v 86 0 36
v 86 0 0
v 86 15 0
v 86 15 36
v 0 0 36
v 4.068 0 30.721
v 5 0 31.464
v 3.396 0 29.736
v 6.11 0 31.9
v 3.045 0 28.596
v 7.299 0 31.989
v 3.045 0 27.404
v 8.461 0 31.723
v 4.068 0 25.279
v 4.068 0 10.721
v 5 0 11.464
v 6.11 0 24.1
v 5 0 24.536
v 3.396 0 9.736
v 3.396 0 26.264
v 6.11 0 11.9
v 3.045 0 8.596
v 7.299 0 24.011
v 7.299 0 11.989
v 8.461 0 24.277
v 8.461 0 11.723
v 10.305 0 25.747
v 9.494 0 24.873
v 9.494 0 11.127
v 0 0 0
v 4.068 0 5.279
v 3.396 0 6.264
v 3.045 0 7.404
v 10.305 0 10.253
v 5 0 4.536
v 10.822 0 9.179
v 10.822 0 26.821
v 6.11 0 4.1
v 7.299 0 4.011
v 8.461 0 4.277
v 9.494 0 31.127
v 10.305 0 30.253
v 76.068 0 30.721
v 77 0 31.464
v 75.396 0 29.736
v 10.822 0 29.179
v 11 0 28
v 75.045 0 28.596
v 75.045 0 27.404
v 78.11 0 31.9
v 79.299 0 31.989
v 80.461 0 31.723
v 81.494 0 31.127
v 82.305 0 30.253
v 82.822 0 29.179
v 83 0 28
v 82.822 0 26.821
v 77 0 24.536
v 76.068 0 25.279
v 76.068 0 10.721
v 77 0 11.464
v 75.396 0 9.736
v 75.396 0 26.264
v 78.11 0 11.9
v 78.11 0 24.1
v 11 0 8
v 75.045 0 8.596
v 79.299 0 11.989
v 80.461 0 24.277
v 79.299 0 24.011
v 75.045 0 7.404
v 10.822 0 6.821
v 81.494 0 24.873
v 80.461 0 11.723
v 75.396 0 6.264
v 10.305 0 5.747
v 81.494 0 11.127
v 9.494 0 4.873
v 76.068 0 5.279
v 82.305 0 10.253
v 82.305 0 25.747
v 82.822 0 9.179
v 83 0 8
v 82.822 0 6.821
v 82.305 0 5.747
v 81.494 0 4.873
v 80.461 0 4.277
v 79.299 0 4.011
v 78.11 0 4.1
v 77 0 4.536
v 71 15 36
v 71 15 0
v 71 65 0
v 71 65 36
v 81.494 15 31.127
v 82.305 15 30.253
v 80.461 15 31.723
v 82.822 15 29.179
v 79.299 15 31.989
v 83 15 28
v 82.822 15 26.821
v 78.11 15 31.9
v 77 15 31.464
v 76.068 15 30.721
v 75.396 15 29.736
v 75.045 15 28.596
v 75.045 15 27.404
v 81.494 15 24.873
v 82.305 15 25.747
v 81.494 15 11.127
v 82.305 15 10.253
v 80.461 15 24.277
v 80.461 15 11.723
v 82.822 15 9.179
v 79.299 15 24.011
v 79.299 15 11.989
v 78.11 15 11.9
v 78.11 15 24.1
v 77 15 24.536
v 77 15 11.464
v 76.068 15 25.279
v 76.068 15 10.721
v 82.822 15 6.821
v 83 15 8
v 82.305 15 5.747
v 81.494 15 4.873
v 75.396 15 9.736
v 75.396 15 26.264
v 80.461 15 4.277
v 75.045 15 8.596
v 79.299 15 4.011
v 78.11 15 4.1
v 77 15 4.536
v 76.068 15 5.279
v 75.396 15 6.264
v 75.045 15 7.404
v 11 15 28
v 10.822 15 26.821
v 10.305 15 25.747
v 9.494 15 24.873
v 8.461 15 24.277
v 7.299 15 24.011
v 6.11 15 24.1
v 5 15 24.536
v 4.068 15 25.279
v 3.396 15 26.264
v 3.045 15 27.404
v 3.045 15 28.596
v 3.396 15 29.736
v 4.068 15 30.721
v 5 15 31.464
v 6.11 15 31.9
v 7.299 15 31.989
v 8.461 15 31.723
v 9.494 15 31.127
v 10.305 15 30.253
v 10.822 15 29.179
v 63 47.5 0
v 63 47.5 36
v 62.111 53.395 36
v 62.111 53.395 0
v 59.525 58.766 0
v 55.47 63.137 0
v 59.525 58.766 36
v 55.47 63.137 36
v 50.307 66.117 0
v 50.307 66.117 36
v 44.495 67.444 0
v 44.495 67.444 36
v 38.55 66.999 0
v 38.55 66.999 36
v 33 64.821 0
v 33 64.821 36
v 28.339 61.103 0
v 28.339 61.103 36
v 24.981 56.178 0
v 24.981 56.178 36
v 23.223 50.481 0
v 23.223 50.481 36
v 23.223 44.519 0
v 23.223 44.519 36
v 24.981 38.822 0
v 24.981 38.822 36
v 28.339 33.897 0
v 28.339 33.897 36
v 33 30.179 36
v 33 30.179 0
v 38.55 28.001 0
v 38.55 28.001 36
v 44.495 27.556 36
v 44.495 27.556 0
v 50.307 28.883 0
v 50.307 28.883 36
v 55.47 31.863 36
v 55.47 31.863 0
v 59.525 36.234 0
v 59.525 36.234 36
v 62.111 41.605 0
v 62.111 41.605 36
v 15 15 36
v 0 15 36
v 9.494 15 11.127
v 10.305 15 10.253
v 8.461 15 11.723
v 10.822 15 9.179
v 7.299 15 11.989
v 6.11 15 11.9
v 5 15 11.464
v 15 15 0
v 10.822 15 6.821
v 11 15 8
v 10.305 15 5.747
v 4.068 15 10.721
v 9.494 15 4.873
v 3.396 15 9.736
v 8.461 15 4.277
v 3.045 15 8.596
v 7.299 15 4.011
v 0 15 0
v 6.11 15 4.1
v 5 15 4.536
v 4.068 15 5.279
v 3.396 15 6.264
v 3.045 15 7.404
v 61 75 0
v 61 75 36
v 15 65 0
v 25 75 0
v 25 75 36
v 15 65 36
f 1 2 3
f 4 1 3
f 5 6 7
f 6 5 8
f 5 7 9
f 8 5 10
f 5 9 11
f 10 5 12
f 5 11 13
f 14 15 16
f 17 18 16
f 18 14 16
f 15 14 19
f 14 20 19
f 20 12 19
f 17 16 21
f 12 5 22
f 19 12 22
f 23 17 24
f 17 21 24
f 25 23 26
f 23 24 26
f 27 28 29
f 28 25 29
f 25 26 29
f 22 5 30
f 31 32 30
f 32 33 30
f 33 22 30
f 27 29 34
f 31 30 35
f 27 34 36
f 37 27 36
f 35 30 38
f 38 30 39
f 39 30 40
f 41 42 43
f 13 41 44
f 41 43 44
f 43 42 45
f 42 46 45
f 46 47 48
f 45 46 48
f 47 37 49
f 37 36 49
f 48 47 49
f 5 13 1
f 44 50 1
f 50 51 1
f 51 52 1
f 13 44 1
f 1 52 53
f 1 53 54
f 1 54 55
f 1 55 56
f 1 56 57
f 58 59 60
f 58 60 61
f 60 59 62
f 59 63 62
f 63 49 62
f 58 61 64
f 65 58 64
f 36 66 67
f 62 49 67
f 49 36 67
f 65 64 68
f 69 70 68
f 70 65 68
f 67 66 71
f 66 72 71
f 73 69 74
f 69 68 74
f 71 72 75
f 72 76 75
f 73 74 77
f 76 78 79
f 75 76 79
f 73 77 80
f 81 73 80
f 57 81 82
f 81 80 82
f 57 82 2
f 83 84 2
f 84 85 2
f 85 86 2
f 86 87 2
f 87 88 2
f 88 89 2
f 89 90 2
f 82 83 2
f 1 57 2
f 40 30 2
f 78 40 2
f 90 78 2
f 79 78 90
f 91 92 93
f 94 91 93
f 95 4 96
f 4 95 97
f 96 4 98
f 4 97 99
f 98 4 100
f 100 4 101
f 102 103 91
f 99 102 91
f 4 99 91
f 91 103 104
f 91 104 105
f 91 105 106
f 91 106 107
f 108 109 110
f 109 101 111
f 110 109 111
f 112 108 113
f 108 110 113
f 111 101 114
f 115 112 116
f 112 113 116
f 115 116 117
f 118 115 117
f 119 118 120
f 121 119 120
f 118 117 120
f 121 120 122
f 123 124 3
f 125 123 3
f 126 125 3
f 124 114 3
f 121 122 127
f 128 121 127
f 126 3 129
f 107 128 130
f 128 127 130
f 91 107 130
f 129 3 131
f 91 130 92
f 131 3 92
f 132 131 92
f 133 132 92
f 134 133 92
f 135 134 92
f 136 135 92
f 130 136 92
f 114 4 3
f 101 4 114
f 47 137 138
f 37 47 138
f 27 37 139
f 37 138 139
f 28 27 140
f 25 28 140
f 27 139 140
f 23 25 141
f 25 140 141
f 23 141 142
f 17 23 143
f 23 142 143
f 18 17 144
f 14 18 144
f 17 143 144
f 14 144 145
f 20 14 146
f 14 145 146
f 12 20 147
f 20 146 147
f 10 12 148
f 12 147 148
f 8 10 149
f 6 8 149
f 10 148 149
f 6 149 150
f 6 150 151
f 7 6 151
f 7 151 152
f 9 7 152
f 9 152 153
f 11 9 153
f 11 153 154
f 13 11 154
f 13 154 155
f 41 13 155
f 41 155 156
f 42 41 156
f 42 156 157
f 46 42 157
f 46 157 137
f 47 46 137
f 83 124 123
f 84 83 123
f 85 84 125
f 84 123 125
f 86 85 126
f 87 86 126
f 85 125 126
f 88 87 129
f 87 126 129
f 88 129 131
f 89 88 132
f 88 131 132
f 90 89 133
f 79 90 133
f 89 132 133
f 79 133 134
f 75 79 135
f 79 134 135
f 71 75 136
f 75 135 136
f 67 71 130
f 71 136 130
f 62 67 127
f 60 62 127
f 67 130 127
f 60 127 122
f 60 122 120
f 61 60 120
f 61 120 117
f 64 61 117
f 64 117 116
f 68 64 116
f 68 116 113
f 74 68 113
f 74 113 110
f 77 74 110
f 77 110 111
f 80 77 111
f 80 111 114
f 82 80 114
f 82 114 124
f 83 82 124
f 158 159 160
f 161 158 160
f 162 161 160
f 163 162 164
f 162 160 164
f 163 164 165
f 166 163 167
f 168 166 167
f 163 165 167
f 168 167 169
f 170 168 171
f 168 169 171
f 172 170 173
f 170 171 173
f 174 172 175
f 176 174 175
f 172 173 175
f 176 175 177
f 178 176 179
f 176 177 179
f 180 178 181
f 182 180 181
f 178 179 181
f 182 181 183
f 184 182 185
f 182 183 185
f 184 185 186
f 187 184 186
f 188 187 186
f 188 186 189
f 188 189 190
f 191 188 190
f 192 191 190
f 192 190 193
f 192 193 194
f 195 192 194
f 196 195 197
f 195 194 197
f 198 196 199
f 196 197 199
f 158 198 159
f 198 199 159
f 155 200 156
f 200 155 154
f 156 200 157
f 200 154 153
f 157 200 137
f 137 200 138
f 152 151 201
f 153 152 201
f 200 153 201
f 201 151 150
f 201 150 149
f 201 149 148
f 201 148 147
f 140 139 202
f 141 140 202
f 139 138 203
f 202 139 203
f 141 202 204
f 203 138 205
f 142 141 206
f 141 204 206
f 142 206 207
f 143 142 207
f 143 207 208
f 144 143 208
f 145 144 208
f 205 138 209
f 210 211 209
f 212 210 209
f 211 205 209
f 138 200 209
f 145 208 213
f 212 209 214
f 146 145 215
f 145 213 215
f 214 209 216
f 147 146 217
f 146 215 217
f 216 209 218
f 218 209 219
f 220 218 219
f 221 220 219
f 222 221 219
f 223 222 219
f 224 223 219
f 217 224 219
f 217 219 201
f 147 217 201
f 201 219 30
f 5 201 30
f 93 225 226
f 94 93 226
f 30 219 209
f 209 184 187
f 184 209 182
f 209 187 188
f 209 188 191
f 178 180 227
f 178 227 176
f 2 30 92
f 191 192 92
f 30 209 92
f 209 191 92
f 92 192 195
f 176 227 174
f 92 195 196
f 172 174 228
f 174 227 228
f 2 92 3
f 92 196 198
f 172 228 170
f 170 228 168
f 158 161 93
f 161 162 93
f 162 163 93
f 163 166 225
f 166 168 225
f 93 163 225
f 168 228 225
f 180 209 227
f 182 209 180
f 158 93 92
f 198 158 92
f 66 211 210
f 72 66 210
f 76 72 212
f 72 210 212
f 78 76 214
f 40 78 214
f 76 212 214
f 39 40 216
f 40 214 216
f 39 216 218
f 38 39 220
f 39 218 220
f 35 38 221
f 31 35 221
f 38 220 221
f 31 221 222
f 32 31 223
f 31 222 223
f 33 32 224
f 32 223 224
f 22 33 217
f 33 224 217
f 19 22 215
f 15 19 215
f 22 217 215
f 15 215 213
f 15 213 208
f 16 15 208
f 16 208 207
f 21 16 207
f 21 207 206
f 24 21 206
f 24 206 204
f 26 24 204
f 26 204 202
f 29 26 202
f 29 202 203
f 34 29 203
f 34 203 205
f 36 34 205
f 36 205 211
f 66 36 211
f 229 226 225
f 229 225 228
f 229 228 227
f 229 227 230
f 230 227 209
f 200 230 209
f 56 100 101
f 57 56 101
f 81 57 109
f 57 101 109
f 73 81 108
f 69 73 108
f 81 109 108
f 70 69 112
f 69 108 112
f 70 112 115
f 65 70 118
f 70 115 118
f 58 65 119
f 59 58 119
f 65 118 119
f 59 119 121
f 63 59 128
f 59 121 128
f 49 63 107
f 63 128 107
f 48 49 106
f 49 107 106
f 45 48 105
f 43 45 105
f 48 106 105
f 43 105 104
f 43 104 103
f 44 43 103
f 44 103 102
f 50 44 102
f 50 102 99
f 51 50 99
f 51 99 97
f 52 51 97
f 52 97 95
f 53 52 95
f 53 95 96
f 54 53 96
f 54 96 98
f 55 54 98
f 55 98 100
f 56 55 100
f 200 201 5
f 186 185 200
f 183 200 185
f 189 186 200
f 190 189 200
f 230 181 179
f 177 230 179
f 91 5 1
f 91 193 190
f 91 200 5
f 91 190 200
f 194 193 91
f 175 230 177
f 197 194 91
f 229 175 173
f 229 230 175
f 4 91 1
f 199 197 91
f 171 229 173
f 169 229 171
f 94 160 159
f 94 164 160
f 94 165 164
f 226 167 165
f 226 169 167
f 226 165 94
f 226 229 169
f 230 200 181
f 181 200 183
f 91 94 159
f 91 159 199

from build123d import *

# Parameters (mm, degrees)
DODANIE_WYCI_GNI_CIE1_DEPTH = 36
SZKIC2_R                    = 20
WYTNIJ_WYCI_GNI_CIE1_DEPTH  = 36
SFAZOWANIE1_SIZE            = 10
SZKIC3_R                    = 4
WYTNIJ_WYCI_GNI_CIE2_DEPTH  = 18


with BuildPart() as part:
    # Szkic1 → Dodanie-wyciągnięcie1 (new body)
    with BuildSketch(Plane.XY):
        Polygon((0, 0), (86, 0), (86, 15), (71, 15), (71, 75), (15, 75), (15, 15), (0, 15), align=None)
    extrude(amount=DODANIE_WYCI_GNI_CIE1_DEPTH)

    # Szkic2 → Wytnij-wyciągnięcie1 (cut)
    with BuildSketch(Plane.XY.offset(36)):
        with Locations((43, 47.5)):
            Circle(SZKIC2_R)
    extrude(amount=-WYTNIJ_WYCI_GNI_CIE1_DEPTH, mode=Mode.SUBTRACT)

    # Sfazowanie1
    sfazowanie1_edges = [part.edges().sort_by_distance(p)[0] for p in [
        (15, 75, 18),
        (71, 75, 18),
    ]]
    chamfer(sfazowanie1_edges, length=SFAZOWANIE1_SIZE)

    # Szkic3 → Wytnij-wyciągnięcie2 (cut)
    with BuildSketch(Plane(origin=(0, 15, 0), x_dir=(1, 0, 0), z_dir=(0, 1, 0))):
        with Locations((79, -8)):
            Circle(SZKIC3_R)
        with Locations((7, -8)):
            Circle(SZKIC3_R)
        with Locations((79, -28)):
            Circle(SZKIC3_R)
        with Locations((7, -28)):
            Circle(SZKIC3_R)
    extrude(amount=-WYTNIJ_WYCI_GNI_CIE2_DEPTH, mode=Mode.SUBTRACT)


solid = part.part
